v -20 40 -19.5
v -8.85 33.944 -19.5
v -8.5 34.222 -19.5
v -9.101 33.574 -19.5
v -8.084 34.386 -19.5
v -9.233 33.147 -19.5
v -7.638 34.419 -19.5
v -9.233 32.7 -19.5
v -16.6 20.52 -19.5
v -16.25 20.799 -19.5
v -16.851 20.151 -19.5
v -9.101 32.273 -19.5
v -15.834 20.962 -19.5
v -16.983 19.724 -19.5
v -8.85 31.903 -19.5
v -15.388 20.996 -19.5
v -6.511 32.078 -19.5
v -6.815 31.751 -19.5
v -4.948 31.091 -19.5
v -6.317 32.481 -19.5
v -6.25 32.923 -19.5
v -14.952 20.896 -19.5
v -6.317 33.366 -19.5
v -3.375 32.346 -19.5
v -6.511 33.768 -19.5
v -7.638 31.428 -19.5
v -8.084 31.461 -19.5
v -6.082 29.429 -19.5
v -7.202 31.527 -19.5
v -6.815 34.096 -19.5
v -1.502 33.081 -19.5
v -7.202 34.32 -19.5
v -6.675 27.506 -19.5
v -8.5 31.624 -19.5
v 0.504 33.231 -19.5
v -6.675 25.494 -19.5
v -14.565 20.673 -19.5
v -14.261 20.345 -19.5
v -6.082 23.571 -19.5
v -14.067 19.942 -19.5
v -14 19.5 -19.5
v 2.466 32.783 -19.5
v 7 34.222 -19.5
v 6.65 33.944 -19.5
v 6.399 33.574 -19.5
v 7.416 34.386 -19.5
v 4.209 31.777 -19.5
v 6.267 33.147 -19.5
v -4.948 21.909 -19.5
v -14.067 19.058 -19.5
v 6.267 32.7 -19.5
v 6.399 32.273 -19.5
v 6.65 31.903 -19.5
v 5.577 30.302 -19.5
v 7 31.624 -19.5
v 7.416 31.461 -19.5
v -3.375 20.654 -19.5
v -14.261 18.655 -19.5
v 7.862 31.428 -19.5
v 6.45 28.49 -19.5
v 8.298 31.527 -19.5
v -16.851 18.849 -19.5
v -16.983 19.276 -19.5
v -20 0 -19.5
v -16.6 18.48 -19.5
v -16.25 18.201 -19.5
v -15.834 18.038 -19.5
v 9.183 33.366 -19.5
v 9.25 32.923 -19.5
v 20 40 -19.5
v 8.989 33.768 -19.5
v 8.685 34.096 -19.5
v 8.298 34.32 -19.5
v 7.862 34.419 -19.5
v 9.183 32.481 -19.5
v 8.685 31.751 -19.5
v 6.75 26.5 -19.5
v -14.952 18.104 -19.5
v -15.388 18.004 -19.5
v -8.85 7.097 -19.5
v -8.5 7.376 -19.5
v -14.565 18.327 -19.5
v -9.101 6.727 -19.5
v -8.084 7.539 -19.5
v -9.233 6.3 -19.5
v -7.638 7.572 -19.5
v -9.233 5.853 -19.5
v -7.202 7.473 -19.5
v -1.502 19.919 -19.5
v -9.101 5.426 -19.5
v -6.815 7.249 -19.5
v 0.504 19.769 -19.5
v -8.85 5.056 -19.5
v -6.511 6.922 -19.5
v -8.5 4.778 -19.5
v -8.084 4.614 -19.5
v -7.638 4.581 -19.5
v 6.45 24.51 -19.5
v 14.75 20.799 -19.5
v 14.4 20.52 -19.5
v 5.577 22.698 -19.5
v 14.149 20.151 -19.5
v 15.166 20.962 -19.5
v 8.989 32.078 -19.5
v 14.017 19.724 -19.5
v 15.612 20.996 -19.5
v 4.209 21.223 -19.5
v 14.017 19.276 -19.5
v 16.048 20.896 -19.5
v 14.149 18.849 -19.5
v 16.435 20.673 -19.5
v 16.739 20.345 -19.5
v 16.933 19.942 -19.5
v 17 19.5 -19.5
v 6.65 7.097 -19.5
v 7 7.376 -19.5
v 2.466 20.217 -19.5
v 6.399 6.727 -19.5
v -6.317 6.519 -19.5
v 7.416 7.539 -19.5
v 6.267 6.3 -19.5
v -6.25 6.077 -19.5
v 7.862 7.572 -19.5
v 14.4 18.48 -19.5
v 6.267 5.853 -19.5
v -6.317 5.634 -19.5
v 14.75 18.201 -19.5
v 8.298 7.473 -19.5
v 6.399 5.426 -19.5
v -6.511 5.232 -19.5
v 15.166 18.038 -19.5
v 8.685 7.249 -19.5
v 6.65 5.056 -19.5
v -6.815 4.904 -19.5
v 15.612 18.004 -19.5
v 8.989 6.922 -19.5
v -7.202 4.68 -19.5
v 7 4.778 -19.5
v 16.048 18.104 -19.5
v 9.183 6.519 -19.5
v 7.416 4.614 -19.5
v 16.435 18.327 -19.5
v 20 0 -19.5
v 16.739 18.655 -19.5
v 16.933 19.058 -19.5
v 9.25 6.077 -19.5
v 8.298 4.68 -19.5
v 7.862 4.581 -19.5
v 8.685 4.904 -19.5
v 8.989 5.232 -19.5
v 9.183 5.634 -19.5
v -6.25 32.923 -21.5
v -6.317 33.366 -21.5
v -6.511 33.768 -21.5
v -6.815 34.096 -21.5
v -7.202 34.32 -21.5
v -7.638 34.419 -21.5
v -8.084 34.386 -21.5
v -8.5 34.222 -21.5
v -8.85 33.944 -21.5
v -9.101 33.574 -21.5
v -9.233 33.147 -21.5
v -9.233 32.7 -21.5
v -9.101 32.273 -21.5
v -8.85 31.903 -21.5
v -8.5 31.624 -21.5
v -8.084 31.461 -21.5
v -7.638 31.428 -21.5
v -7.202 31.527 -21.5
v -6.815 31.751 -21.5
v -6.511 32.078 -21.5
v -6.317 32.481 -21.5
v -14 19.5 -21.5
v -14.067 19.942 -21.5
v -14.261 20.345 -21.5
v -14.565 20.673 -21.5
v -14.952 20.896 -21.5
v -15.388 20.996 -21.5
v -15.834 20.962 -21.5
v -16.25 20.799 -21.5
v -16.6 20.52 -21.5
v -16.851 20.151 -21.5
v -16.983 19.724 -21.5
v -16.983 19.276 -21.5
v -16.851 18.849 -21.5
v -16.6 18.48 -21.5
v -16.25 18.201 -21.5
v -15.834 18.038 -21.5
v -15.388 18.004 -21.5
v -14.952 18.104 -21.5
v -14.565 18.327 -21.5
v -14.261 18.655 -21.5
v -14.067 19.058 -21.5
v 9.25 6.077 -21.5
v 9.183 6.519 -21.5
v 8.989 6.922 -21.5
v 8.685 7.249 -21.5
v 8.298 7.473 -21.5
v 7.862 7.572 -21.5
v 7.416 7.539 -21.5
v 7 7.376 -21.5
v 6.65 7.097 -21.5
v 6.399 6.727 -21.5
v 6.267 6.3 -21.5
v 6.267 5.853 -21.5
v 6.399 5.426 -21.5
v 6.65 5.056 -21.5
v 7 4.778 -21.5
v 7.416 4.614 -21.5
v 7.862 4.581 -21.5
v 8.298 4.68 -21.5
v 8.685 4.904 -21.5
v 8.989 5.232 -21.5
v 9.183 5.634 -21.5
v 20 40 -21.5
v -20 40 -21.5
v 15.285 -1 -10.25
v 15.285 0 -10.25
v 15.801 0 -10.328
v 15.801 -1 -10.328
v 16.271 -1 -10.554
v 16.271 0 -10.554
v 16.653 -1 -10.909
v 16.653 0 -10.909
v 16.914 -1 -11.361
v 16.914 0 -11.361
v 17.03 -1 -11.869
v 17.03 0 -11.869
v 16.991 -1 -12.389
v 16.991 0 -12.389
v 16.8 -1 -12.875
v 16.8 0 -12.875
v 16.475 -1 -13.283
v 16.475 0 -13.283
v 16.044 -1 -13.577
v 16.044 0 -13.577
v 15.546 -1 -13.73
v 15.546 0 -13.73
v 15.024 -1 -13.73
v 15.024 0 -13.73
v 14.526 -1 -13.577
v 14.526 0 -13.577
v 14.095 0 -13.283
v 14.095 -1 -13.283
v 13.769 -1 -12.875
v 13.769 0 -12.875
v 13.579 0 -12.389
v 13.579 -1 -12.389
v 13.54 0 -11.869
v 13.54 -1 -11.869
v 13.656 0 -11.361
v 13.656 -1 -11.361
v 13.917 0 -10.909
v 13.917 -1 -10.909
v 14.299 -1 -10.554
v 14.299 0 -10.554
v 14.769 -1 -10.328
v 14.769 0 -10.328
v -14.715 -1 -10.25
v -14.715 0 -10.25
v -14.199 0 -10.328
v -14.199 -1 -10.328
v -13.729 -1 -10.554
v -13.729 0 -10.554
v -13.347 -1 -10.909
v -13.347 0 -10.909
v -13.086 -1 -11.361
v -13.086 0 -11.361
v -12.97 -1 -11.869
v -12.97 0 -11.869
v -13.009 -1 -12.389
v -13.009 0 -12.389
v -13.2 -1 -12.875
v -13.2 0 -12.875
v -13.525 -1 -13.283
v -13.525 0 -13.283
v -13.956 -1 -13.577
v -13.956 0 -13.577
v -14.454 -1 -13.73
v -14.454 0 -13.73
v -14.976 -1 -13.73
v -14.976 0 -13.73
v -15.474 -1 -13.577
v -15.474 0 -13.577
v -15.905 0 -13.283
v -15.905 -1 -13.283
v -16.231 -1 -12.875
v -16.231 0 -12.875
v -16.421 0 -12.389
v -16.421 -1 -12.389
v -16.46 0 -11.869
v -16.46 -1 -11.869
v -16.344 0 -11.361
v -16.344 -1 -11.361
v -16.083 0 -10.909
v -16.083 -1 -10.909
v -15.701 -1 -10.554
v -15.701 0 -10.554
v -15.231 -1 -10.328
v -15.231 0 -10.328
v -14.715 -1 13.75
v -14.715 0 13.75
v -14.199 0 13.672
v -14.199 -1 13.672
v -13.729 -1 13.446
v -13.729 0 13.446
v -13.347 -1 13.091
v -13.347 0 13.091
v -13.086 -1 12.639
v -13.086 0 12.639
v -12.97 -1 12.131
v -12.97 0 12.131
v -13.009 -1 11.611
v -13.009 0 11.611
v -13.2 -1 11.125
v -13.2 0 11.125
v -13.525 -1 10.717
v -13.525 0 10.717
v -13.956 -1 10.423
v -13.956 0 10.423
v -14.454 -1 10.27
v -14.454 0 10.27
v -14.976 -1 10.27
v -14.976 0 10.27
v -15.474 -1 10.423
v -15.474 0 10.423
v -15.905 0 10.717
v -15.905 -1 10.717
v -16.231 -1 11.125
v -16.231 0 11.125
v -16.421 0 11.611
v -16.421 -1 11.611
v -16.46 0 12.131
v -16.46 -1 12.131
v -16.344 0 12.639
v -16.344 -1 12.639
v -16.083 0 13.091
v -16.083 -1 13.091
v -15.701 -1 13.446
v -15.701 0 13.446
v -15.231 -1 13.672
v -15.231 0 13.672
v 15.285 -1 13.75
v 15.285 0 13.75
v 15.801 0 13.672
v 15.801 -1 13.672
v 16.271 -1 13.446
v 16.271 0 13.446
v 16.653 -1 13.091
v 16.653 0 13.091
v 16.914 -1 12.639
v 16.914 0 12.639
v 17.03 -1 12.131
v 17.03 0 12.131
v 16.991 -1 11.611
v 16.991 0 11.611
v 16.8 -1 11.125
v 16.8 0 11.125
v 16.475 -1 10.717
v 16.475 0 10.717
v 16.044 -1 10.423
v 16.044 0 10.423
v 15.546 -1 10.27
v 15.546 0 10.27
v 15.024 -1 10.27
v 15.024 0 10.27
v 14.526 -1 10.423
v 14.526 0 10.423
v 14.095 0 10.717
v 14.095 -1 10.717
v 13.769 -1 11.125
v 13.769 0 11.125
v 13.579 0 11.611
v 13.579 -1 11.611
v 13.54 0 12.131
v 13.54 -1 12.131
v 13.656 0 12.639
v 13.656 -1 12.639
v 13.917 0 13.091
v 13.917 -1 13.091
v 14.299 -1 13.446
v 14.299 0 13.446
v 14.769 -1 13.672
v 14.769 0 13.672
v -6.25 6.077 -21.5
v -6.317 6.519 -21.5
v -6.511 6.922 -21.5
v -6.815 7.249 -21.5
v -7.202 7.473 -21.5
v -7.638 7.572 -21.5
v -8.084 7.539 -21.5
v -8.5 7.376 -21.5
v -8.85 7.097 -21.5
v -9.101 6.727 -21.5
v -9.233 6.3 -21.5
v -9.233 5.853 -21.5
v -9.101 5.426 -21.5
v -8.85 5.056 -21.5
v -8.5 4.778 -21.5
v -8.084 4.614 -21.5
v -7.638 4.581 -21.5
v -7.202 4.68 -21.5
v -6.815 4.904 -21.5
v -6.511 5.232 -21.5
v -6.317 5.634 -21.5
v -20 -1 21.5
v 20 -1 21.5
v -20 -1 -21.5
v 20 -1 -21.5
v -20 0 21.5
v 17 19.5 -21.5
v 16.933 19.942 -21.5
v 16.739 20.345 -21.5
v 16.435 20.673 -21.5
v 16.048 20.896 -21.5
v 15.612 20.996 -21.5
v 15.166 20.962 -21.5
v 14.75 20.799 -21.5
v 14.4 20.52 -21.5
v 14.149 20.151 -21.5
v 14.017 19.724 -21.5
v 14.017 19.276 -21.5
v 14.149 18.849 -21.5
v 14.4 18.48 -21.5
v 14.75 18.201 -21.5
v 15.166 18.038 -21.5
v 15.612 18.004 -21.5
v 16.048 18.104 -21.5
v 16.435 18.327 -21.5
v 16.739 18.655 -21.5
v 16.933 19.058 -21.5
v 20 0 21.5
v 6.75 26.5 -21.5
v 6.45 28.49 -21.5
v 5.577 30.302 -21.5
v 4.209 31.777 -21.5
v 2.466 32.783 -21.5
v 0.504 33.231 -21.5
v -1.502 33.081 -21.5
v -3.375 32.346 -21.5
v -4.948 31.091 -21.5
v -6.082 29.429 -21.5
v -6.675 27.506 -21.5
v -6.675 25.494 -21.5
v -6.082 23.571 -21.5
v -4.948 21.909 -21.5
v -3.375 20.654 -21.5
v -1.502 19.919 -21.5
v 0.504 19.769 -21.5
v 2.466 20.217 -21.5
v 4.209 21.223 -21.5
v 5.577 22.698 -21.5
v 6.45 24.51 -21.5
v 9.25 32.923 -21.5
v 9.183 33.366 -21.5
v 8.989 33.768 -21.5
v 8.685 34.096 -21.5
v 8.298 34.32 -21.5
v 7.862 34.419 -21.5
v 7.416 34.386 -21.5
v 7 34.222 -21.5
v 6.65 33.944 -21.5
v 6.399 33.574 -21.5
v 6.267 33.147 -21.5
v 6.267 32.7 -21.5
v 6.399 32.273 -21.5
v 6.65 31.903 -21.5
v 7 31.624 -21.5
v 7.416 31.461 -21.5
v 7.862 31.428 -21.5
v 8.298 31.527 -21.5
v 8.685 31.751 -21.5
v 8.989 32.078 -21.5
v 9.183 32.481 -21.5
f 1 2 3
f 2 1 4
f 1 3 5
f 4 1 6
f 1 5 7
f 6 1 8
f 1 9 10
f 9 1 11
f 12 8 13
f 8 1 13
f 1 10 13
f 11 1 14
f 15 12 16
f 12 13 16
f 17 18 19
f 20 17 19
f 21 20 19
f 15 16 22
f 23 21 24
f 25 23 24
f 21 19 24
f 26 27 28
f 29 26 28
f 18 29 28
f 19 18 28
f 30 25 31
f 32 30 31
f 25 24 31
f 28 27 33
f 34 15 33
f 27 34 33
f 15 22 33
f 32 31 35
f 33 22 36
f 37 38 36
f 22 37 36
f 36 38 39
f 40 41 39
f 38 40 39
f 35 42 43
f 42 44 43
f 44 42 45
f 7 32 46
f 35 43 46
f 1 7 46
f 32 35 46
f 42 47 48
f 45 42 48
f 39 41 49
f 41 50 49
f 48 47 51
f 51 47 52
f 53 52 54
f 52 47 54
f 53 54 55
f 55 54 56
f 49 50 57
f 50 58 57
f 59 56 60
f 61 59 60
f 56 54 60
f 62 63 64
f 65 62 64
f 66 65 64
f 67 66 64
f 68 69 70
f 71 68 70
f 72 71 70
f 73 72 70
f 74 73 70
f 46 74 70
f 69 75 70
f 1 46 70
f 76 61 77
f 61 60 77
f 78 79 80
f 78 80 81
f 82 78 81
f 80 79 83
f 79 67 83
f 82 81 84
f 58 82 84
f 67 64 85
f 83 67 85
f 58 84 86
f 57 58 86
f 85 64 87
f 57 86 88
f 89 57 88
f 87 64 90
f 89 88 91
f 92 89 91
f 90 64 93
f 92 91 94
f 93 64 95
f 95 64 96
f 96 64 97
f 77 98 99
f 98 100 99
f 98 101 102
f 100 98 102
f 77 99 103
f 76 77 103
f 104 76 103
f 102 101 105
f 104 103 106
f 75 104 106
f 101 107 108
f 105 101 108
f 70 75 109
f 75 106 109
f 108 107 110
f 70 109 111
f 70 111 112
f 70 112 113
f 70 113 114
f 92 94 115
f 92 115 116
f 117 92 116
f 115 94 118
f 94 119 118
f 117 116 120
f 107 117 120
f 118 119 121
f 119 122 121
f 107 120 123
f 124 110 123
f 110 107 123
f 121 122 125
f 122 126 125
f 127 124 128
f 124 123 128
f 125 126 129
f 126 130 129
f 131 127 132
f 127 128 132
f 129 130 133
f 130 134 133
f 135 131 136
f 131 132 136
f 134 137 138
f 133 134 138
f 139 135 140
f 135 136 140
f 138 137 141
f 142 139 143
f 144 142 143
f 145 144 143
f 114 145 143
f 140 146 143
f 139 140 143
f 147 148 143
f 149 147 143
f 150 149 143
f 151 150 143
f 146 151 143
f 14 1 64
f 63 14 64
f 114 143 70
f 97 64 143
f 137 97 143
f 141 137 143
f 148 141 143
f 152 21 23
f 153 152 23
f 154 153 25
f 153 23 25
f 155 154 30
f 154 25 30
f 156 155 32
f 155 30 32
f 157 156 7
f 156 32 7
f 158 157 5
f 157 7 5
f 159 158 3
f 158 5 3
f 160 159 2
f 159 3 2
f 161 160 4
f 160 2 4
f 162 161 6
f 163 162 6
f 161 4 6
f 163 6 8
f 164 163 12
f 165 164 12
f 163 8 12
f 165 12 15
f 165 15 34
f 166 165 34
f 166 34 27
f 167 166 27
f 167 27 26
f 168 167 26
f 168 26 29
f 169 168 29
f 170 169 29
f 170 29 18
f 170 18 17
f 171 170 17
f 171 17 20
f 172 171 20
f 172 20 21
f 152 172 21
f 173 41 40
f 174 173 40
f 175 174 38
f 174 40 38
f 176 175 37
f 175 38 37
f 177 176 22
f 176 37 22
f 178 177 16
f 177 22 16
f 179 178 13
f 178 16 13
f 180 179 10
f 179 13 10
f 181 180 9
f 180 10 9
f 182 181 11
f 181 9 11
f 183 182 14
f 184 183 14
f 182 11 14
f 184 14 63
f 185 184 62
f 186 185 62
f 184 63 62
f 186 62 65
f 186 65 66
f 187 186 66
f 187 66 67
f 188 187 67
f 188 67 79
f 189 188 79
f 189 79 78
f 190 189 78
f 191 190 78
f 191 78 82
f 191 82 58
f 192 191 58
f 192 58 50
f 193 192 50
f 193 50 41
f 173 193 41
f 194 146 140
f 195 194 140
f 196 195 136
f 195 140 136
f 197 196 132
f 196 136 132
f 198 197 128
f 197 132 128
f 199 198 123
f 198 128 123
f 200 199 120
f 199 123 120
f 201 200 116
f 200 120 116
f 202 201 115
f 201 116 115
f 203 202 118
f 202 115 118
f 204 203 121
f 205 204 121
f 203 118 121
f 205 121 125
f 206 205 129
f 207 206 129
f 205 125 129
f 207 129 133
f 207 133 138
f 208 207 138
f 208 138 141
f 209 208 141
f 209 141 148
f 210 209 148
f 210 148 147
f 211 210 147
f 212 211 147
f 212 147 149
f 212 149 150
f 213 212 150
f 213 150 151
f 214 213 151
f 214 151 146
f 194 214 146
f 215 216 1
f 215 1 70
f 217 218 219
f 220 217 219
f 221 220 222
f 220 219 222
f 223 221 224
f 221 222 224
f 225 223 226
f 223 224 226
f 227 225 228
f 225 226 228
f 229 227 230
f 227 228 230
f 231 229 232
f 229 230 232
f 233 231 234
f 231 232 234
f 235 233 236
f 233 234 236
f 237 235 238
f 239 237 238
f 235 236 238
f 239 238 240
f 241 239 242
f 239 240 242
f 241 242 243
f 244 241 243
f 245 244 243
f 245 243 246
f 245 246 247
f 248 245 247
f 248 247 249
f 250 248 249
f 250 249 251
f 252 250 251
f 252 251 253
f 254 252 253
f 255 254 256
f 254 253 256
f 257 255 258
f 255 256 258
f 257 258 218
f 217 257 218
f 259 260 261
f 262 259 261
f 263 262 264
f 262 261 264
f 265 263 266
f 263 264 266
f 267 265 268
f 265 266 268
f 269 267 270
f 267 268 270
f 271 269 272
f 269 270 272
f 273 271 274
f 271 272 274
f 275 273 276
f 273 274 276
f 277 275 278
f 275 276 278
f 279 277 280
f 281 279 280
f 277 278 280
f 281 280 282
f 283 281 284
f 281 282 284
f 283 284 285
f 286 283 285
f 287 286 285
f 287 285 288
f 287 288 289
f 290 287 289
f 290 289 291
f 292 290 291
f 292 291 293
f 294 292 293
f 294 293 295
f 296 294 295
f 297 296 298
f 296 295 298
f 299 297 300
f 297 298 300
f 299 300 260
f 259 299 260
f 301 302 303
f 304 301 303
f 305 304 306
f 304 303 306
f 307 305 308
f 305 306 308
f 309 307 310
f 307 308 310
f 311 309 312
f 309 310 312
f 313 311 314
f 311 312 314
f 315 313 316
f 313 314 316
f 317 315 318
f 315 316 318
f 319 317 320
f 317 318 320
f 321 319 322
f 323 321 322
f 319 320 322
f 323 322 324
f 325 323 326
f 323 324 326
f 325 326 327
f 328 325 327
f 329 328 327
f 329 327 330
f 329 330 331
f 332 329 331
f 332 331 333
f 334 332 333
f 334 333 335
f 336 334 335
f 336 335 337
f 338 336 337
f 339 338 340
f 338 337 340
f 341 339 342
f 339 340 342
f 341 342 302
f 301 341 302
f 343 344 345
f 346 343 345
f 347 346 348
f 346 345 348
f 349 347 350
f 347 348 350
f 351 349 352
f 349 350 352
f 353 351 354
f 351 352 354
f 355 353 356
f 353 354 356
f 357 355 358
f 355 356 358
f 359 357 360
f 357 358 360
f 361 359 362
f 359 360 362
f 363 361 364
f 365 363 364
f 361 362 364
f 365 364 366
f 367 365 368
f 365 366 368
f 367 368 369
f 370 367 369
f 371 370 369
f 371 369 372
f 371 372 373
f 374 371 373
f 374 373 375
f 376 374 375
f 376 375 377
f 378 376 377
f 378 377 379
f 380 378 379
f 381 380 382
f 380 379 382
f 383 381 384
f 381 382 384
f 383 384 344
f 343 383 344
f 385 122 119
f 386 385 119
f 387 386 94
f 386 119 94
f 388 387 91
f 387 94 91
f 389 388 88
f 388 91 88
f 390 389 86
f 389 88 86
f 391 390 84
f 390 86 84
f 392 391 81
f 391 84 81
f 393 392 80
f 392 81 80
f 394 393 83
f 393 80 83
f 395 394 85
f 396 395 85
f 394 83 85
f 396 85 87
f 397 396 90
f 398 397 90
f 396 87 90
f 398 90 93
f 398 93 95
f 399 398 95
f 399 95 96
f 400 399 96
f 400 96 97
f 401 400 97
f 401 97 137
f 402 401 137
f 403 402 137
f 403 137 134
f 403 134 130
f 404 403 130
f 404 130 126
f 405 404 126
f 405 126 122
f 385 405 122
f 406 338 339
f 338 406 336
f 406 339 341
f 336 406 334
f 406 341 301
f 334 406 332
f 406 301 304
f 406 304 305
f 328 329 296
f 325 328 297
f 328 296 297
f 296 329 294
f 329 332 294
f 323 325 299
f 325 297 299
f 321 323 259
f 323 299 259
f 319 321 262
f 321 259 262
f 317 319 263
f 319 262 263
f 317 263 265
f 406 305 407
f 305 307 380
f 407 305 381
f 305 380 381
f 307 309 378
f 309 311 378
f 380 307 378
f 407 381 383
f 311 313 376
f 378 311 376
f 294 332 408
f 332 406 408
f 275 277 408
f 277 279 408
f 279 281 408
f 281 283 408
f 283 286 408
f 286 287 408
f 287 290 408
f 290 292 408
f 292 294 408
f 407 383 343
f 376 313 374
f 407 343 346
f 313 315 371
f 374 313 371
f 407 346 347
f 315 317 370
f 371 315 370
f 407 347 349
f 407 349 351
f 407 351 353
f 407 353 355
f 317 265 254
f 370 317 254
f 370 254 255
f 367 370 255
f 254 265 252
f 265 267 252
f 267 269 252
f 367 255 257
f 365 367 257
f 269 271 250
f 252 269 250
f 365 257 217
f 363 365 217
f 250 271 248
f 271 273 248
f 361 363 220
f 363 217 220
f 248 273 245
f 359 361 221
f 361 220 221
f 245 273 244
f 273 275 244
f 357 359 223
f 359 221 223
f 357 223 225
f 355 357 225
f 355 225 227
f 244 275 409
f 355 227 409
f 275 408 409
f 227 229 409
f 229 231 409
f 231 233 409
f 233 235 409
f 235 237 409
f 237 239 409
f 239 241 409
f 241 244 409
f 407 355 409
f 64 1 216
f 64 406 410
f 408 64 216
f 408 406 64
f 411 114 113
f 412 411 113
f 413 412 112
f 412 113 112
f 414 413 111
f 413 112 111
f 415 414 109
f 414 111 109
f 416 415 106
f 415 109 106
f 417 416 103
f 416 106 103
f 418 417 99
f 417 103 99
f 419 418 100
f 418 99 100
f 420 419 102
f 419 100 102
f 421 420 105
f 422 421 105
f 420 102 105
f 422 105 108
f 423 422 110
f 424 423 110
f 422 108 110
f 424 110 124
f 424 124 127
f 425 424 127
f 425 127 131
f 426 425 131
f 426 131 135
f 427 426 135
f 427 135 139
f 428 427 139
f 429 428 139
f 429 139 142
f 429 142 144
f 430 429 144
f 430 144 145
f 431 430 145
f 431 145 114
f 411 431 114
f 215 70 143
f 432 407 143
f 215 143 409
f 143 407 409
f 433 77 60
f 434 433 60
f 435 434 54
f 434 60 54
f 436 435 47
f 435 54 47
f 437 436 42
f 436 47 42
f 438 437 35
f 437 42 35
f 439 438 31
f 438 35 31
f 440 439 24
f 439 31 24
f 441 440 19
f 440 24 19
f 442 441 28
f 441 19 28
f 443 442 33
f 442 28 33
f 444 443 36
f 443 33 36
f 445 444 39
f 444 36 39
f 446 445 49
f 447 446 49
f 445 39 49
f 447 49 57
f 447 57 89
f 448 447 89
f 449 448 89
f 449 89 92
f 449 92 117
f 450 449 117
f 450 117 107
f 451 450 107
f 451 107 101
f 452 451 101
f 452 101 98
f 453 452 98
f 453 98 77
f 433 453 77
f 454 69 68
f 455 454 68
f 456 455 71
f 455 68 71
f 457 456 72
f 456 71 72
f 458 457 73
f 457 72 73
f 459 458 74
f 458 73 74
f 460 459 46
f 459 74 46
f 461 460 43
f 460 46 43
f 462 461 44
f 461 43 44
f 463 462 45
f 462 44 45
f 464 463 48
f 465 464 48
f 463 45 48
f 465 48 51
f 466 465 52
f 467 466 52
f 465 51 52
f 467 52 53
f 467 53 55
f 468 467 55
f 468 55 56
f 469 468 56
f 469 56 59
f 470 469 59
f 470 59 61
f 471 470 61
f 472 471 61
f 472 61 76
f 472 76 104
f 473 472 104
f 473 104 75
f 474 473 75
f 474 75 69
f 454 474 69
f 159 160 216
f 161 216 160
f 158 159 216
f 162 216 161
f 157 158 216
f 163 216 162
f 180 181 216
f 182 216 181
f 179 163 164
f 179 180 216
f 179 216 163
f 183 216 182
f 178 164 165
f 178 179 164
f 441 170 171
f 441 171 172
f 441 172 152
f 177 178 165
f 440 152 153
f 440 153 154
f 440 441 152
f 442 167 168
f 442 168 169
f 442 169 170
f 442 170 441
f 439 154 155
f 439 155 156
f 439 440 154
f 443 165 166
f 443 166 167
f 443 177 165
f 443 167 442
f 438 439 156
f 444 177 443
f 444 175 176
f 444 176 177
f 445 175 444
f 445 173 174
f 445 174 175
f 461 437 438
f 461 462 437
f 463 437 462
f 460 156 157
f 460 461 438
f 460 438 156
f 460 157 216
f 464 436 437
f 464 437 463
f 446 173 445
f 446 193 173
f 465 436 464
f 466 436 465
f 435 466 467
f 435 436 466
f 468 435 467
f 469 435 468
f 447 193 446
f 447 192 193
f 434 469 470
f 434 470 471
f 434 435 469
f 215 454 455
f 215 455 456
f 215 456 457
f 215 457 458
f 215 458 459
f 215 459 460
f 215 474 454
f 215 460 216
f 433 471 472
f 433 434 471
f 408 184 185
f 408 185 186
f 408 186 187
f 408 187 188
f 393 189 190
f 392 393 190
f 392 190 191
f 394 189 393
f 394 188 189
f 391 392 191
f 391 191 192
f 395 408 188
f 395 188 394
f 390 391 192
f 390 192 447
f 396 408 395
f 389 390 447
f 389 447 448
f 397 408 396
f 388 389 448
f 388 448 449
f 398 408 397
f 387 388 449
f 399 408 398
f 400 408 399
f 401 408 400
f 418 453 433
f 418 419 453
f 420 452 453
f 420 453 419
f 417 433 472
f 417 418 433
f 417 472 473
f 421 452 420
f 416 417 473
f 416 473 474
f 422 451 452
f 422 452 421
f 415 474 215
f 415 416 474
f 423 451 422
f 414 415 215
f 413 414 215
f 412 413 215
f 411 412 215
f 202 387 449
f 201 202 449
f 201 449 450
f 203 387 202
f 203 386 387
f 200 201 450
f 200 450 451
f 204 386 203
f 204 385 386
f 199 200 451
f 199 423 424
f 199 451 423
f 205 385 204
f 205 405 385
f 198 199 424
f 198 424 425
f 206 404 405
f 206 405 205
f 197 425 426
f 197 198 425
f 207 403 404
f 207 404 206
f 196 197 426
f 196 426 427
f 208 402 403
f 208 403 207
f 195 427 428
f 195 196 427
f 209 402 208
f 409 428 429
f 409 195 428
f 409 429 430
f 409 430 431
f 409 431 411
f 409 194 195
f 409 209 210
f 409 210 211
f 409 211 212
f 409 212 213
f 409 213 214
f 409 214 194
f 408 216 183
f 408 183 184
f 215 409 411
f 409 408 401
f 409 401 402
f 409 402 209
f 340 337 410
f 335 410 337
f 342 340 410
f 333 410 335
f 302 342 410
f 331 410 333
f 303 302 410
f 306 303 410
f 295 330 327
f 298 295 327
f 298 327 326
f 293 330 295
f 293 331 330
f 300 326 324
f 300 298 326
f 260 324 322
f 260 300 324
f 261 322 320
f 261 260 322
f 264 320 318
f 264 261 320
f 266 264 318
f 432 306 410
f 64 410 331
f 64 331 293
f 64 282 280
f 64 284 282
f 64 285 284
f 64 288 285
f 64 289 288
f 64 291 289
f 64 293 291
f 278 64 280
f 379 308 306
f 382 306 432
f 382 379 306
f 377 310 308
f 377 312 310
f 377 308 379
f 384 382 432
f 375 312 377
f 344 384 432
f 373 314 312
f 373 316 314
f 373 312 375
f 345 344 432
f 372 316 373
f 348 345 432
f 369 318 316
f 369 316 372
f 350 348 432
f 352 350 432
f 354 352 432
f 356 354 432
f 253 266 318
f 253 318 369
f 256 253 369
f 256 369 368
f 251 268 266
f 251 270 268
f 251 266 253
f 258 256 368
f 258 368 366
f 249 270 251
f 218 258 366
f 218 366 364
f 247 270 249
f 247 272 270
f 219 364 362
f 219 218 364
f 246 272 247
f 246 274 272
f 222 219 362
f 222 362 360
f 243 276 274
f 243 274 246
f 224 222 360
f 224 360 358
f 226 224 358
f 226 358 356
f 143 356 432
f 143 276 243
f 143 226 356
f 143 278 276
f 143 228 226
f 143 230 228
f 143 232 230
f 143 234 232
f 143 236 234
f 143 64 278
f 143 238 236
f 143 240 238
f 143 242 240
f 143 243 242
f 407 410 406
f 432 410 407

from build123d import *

# Parameters (mm, degrees)
SKETCH1_W           = 40
SKETCH1_H           = 43
SKETCH1_R           = 1.75
BOSS_EXTRUDE1_DEPTH = 1
SKETCH4_W           = 40
SKETCH4_H           = 2
BOSS_EXTRUDE2_DEPTH = 40
SKETCH5_R           = 6.75
CUT_EXTRUDE5_DEPTH  = 34
SKETCH8_R           = 1.5
CUT_EXTRUDE6_DEPTH  = 10


with BuildPart() as part:
    # Sketch1 → Boss-Extrude1 (new body)
    with BuildSketch(Plane(origin=(0, 0, 0), x_dir=(1, 0, 0), z_dir=(0, 1, 0))):
        Rectangle(SKETCH1_W, SKETCH1_H)
        with Locations(Location((-14.715053003, 12, 0), (0, 0, 270))):
            Circle(SKETCH1_R, mode=Mode.SUBTRACT)
        with Locations(Location((15.284946997, 12, 0), (0, 0, 270))):
            Circle(SKETCH1_R, mode=Mode.SUBTRACT)
        with Locations(Location((-14.715053003, -12, 0), (0, 0, 270))):
            Circle(SKETCH1_R, mode=Mode.SUBTRACT)
        with Locations(Location((15.284946997, -12, 0), (0, 0, 270))):
            Circle(SKETCH1_R, mode=Mode.SUBTRACT)
    extrude(amount=-BOSS_EXTRUDE1_DEPTH)

    # Sketch4 → Boss-Extrude2 (add)
    with BuildSketch(Plane(origin=(0, 0, 0), x_dir=(1, 0, 0), z_dir=(0, 1, 0))):
        with Locations((0, 20.5)):
            Rectangle(SKETCH4_W, SKETCH4_H)
    extrude(amount=BOSS_EXTRUDE2_DEPTH)

    # Sketch5 → Cut-Extrude5 (cut)
    with BuildSketch(Plane.XY.offset(-19.5)):
        with Locations((0, 26.5)):
            Circle(SKETCH5_R)
    extrude(amount=-CUT_EXTRUDE5_DEPTH, mode=Mode.SUBTRACT)

    # Sketch8 → Cut-Extrude6 (cut)
    with BuildSketch(Plane.XY.offset(-19.5)):
        with Locations((-15.5, 19.5)):
            Circle(SKETCH8_R)
        with Locations((-7.75, 32.923393759)):
            Circle(SKETCH8_R)
        with Locations((7.75, 32.923393759)):
            Circle(SKETCH8_R)
        with Locations((15.5, 19.5)):
            Circle(SKETCH8_R)
        with Locations((7.75, 6.076606241)):
            Circle(SKETCH8_R)
        with Locations((-7.75, 6.076606241)):
            Circle(SKETCH8_R)
    extrude(amount=-CUT_EXTRUDE6_DEPTH, mode=Mode.SUBTRACT)


solid = part.part
